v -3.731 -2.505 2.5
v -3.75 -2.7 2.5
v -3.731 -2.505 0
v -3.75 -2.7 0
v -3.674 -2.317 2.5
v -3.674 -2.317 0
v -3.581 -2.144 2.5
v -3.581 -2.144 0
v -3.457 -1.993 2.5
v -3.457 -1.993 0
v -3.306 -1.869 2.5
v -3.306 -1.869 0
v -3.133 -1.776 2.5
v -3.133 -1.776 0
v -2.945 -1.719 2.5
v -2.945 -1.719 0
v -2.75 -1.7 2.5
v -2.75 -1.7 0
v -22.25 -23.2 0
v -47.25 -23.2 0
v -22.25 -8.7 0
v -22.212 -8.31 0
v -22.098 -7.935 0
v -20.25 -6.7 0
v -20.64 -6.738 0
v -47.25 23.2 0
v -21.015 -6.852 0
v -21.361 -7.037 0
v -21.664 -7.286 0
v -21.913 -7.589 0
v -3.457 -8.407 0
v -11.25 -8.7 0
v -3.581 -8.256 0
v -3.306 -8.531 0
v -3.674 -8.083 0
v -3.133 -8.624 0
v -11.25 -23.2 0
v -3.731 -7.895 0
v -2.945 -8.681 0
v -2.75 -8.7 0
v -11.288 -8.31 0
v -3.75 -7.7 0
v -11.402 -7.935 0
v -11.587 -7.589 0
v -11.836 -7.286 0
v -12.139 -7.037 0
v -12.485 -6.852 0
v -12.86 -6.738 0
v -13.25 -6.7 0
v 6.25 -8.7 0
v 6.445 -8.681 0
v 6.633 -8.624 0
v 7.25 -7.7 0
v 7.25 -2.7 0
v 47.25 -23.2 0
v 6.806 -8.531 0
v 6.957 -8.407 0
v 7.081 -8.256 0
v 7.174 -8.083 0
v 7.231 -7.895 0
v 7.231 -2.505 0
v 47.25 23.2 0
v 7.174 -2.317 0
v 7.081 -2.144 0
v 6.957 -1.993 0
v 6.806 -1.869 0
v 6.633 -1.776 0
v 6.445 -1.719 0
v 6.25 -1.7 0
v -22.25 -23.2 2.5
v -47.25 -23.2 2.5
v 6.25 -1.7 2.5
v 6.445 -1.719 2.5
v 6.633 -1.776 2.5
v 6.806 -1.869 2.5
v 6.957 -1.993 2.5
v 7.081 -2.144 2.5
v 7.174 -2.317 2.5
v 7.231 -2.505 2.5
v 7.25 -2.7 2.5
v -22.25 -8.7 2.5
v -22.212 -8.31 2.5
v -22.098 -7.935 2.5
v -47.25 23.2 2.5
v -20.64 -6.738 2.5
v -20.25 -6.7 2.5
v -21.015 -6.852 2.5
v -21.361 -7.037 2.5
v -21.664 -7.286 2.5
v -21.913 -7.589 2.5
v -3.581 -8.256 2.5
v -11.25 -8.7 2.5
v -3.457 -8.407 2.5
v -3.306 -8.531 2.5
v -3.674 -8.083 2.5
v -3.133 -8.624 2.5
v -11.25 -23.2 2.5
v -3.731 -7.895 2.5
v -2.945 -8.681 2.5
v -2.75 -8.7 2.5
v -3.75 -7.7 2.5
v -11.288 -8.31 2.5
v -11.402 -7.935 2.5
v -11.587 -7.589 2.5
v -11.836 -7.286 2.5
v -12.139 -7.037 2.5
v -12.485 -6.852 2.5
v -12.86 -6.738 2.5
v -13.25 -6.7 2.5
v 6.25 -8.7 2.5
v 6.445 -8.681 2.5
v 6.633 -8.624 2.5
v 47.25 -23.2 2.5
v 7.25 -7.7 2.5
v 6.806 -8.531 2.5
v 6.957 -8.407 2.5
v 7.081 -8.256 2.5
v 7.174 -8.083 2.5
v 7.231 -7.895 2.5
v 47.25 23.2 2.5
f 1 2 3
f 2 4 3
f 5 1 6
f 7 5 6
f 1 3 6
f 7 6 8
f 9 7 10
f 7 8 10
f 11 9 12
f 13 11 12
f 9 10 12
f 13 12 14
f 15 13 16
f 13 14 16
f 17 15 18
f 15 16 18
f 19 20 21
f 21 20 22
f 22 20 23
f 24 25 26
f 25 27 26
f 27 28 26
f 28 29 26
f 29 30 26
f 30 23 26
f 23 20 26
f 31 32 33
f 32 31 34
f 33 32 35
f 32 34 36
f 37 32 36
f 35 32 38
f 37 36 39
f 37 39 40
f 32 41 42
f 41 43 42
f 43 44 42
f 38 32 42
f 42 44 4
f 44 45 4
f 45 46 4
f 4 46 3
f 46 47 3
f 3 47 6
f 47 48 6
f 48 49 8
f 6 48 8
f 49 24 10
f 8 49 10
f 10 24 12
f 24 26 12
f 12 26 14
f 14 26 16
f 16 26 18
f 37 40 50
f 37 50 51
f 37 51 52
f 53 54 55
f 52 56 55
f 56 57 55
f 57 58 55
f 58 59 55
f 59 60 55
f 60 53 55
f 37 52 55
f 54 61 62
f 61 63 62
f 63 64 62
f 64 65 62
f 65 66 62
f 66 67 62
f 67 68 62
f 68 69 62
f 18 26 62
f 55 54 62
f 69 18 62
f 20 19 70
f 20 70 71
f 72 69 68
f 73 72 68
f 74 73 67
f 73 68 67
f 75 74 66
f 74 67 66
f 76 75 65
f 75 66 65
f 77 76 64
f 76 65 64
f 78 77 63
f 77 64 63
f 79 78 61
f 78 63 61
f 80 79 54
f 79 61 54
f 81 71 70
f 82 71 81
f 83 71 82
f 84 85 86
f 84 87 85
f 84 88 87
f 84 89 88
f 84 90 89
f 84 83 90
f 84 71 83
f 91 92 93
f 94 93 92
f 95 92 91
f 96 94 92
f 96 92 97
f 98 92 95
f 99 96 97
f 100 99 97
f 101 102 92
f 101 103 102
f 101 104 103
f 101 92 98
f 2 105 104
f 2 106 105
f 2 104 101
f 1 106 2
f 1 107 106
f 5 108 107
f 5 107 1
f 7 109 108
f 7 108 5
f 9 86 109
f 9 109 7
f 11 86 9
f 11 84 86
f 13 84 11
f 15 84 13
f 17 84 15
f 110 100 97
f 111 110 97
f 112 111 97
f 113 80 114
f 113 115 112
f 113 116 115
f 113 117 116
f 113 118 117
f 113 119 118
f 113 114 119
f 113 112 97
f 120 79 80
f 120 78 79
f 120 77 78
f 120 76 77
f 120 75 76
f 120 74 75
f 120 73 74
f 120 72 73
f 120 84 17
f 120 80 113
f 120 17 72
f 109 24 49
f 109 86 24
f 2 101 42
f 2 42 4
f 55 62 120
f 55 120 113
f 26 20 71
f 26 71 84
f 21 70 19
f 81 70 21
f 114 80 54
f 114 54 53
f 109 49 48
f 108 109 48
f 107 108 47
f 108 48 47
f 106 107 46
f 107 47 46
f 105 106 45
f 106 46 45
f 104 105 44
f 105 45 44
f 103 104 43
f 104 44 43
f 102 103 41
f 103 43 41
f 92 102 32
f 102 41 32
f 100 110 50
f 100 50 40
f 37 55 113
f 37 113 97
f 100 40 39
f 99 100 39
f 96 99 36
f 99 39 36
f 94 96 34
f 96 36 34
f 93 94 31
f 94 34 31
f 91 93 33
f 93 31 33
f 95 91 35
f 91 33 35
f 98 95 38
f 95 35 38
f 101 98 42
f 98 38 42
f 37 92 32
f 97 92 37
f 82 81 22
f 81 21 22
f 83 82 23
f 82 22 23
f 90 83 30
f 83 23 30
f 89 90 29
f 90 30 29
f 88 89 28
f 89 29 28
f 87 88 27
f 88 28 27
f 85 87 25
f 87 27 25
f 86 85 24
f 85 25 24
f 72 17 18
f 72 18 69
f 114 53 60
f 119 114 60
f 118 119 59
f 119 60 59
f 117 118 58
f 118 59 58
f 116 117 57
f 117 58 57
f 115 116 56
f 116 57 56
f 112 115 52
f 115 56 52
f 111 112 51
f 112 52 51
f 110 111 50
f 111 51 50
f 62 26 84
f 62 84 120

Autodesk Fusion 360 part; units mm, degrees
sketch "Sketch1" plane through (0, 0, 0) normal (0, 0, 1) x (1, 0, 0)
  line L0 (-47.25, 23.2) -> (47.25, 23.2)
  line L1 (47.25, 23.2) -> (47.25, -23.2)
  line L2 (47.25, -23.2) -> (-47.25, -23.2)
  line L3 (-47.25, -23.2) -> (-47.25, 23.2)
  line L4 (-47.25, 23.2) -> (47.25, -23.2) construction
  line L5 (47.25, 23.2) -> (-47.25, -23.2) construction
  dimension "d1" = 94.5
  dimension "d2" = 46.4
extrude "Extrude1" add sketch "Sketch1" along normal blind 2.5
sketch "Sketch2" plane through (0, 0, 2.5) normal (0, 0, 1) x (-1, 0, 0)
  line L0 (47.25, 23.2) -> (-47.25, 23.2)
  line L1 (-47.25, 23.2) -> (-47.25, -23.2)
  line L2 (-47.25, -23.2) -> (47.25, -23.2)
  line L3 (47.25, -23.2) -> (47.25, 23.2)
  line L4 (22.25, 6.7) -> (11.25, 6.7)
  line L5 (11.25, 6.7) -> (11.25, 23.2)
  line L6 (11.25, 23.2) -> (22.25, 23.2)
  line L7 (22.25, 23.2) -> (22.25, 6.7)
  line L8 (3.75, 1.7) -> (-7.25, 1.7)
  line L9 (-7.25, 1.7) -> (-7.25, 8.7)
  line L10 (-7.25, 8.7) -> (3.75, 8.7)
  line L11 (3.75, 8.7) -> (3.75, 1.7)
  dimension "d5" = 11
  dimension "d6" = 16.5
  dimension "d7" = 25
  dimension "d12" = 21.5
  dimension "d13" = 40
  dimension "d14" = 11
  dimension "d15" = 7
extrude "Extrude2" cut sketch "Sketch2" against normal blind 5 contours L0 L4 L5 L6 L7 | L8 L9 L10 L11
fillet "Fillet1" radius 2 2 edges at (-22.25, -6.7, 1.25) (-11.25, -6.7, 1.25)
fillet "Fillet2" radius 1 4 edges at (7.25, -1.7, 1.25) (-3.75, -1.7, 1.25) (-3.75, -8.7, 1.25) (7.25, -8.7, 1.25)
sketch "Sketch3" plane through (0, 0, 2.5) normal (0, 0, 1) x (-1, 0, 0)
  line L0 (11.25, 8.7) -> (11.25, 23.2)
  line L1 (11.25, 23.2) -> (-47.25, 23.2)
  line L2 (-47.25, 23.2) -> (-47.25, -23.2)
  line L3 (-47.25, -23.2) -> (47.25, -23.2)
  line L4 (47.25, -23.2) -> (47.25, 23.2)
  line L5 (47.25, 23.2) -> (22.25, 23.2)
  line L6 (22.25, 23.2) -> (22.25, 8.7)
  arc A0 (20.25, 6.7) -> (22.25, 8.7) centre (20.25, 8.7) ccw
  line L7 (20.25, 6.7) -> (13.25, 6.7)
  arc A1 (11.25, 8.7) -> (13.25, 6.7) centre (13.25, 8.7) ccw
  line L8 (-7.25, 2.7) -> (-7.25, 7.7)
  arc A2 (-6.25, 8.7) -> (-7.25, 7.7) centre (-6.25, 7.7) ccw
  line L9 (-6.25, 8.7) -> (2.75, 8.7)
  arc A3 (3.75, 7.7) -> (2.75, 8.7) centre (2.75, 7.7) ccw
  line L10 (3.75, 7.7) -> (3.75, 2.7)
  arc A4 (2.75, 1.7) -> (3.75, 2.7) centre (2.75, 2.7) ccw
  line L11 (2.75, 1.7) -> (-6.25, 1.7)
  arc A5 (-7.25, 2.7) -> (-6.25, 1.7) centre (-6.25, 2.7) ccw
  line L12 (-7.25, 5.2) -> (-7.25, 2.7)
equation "d2 = 52.65 mm - 6.25 mm"
